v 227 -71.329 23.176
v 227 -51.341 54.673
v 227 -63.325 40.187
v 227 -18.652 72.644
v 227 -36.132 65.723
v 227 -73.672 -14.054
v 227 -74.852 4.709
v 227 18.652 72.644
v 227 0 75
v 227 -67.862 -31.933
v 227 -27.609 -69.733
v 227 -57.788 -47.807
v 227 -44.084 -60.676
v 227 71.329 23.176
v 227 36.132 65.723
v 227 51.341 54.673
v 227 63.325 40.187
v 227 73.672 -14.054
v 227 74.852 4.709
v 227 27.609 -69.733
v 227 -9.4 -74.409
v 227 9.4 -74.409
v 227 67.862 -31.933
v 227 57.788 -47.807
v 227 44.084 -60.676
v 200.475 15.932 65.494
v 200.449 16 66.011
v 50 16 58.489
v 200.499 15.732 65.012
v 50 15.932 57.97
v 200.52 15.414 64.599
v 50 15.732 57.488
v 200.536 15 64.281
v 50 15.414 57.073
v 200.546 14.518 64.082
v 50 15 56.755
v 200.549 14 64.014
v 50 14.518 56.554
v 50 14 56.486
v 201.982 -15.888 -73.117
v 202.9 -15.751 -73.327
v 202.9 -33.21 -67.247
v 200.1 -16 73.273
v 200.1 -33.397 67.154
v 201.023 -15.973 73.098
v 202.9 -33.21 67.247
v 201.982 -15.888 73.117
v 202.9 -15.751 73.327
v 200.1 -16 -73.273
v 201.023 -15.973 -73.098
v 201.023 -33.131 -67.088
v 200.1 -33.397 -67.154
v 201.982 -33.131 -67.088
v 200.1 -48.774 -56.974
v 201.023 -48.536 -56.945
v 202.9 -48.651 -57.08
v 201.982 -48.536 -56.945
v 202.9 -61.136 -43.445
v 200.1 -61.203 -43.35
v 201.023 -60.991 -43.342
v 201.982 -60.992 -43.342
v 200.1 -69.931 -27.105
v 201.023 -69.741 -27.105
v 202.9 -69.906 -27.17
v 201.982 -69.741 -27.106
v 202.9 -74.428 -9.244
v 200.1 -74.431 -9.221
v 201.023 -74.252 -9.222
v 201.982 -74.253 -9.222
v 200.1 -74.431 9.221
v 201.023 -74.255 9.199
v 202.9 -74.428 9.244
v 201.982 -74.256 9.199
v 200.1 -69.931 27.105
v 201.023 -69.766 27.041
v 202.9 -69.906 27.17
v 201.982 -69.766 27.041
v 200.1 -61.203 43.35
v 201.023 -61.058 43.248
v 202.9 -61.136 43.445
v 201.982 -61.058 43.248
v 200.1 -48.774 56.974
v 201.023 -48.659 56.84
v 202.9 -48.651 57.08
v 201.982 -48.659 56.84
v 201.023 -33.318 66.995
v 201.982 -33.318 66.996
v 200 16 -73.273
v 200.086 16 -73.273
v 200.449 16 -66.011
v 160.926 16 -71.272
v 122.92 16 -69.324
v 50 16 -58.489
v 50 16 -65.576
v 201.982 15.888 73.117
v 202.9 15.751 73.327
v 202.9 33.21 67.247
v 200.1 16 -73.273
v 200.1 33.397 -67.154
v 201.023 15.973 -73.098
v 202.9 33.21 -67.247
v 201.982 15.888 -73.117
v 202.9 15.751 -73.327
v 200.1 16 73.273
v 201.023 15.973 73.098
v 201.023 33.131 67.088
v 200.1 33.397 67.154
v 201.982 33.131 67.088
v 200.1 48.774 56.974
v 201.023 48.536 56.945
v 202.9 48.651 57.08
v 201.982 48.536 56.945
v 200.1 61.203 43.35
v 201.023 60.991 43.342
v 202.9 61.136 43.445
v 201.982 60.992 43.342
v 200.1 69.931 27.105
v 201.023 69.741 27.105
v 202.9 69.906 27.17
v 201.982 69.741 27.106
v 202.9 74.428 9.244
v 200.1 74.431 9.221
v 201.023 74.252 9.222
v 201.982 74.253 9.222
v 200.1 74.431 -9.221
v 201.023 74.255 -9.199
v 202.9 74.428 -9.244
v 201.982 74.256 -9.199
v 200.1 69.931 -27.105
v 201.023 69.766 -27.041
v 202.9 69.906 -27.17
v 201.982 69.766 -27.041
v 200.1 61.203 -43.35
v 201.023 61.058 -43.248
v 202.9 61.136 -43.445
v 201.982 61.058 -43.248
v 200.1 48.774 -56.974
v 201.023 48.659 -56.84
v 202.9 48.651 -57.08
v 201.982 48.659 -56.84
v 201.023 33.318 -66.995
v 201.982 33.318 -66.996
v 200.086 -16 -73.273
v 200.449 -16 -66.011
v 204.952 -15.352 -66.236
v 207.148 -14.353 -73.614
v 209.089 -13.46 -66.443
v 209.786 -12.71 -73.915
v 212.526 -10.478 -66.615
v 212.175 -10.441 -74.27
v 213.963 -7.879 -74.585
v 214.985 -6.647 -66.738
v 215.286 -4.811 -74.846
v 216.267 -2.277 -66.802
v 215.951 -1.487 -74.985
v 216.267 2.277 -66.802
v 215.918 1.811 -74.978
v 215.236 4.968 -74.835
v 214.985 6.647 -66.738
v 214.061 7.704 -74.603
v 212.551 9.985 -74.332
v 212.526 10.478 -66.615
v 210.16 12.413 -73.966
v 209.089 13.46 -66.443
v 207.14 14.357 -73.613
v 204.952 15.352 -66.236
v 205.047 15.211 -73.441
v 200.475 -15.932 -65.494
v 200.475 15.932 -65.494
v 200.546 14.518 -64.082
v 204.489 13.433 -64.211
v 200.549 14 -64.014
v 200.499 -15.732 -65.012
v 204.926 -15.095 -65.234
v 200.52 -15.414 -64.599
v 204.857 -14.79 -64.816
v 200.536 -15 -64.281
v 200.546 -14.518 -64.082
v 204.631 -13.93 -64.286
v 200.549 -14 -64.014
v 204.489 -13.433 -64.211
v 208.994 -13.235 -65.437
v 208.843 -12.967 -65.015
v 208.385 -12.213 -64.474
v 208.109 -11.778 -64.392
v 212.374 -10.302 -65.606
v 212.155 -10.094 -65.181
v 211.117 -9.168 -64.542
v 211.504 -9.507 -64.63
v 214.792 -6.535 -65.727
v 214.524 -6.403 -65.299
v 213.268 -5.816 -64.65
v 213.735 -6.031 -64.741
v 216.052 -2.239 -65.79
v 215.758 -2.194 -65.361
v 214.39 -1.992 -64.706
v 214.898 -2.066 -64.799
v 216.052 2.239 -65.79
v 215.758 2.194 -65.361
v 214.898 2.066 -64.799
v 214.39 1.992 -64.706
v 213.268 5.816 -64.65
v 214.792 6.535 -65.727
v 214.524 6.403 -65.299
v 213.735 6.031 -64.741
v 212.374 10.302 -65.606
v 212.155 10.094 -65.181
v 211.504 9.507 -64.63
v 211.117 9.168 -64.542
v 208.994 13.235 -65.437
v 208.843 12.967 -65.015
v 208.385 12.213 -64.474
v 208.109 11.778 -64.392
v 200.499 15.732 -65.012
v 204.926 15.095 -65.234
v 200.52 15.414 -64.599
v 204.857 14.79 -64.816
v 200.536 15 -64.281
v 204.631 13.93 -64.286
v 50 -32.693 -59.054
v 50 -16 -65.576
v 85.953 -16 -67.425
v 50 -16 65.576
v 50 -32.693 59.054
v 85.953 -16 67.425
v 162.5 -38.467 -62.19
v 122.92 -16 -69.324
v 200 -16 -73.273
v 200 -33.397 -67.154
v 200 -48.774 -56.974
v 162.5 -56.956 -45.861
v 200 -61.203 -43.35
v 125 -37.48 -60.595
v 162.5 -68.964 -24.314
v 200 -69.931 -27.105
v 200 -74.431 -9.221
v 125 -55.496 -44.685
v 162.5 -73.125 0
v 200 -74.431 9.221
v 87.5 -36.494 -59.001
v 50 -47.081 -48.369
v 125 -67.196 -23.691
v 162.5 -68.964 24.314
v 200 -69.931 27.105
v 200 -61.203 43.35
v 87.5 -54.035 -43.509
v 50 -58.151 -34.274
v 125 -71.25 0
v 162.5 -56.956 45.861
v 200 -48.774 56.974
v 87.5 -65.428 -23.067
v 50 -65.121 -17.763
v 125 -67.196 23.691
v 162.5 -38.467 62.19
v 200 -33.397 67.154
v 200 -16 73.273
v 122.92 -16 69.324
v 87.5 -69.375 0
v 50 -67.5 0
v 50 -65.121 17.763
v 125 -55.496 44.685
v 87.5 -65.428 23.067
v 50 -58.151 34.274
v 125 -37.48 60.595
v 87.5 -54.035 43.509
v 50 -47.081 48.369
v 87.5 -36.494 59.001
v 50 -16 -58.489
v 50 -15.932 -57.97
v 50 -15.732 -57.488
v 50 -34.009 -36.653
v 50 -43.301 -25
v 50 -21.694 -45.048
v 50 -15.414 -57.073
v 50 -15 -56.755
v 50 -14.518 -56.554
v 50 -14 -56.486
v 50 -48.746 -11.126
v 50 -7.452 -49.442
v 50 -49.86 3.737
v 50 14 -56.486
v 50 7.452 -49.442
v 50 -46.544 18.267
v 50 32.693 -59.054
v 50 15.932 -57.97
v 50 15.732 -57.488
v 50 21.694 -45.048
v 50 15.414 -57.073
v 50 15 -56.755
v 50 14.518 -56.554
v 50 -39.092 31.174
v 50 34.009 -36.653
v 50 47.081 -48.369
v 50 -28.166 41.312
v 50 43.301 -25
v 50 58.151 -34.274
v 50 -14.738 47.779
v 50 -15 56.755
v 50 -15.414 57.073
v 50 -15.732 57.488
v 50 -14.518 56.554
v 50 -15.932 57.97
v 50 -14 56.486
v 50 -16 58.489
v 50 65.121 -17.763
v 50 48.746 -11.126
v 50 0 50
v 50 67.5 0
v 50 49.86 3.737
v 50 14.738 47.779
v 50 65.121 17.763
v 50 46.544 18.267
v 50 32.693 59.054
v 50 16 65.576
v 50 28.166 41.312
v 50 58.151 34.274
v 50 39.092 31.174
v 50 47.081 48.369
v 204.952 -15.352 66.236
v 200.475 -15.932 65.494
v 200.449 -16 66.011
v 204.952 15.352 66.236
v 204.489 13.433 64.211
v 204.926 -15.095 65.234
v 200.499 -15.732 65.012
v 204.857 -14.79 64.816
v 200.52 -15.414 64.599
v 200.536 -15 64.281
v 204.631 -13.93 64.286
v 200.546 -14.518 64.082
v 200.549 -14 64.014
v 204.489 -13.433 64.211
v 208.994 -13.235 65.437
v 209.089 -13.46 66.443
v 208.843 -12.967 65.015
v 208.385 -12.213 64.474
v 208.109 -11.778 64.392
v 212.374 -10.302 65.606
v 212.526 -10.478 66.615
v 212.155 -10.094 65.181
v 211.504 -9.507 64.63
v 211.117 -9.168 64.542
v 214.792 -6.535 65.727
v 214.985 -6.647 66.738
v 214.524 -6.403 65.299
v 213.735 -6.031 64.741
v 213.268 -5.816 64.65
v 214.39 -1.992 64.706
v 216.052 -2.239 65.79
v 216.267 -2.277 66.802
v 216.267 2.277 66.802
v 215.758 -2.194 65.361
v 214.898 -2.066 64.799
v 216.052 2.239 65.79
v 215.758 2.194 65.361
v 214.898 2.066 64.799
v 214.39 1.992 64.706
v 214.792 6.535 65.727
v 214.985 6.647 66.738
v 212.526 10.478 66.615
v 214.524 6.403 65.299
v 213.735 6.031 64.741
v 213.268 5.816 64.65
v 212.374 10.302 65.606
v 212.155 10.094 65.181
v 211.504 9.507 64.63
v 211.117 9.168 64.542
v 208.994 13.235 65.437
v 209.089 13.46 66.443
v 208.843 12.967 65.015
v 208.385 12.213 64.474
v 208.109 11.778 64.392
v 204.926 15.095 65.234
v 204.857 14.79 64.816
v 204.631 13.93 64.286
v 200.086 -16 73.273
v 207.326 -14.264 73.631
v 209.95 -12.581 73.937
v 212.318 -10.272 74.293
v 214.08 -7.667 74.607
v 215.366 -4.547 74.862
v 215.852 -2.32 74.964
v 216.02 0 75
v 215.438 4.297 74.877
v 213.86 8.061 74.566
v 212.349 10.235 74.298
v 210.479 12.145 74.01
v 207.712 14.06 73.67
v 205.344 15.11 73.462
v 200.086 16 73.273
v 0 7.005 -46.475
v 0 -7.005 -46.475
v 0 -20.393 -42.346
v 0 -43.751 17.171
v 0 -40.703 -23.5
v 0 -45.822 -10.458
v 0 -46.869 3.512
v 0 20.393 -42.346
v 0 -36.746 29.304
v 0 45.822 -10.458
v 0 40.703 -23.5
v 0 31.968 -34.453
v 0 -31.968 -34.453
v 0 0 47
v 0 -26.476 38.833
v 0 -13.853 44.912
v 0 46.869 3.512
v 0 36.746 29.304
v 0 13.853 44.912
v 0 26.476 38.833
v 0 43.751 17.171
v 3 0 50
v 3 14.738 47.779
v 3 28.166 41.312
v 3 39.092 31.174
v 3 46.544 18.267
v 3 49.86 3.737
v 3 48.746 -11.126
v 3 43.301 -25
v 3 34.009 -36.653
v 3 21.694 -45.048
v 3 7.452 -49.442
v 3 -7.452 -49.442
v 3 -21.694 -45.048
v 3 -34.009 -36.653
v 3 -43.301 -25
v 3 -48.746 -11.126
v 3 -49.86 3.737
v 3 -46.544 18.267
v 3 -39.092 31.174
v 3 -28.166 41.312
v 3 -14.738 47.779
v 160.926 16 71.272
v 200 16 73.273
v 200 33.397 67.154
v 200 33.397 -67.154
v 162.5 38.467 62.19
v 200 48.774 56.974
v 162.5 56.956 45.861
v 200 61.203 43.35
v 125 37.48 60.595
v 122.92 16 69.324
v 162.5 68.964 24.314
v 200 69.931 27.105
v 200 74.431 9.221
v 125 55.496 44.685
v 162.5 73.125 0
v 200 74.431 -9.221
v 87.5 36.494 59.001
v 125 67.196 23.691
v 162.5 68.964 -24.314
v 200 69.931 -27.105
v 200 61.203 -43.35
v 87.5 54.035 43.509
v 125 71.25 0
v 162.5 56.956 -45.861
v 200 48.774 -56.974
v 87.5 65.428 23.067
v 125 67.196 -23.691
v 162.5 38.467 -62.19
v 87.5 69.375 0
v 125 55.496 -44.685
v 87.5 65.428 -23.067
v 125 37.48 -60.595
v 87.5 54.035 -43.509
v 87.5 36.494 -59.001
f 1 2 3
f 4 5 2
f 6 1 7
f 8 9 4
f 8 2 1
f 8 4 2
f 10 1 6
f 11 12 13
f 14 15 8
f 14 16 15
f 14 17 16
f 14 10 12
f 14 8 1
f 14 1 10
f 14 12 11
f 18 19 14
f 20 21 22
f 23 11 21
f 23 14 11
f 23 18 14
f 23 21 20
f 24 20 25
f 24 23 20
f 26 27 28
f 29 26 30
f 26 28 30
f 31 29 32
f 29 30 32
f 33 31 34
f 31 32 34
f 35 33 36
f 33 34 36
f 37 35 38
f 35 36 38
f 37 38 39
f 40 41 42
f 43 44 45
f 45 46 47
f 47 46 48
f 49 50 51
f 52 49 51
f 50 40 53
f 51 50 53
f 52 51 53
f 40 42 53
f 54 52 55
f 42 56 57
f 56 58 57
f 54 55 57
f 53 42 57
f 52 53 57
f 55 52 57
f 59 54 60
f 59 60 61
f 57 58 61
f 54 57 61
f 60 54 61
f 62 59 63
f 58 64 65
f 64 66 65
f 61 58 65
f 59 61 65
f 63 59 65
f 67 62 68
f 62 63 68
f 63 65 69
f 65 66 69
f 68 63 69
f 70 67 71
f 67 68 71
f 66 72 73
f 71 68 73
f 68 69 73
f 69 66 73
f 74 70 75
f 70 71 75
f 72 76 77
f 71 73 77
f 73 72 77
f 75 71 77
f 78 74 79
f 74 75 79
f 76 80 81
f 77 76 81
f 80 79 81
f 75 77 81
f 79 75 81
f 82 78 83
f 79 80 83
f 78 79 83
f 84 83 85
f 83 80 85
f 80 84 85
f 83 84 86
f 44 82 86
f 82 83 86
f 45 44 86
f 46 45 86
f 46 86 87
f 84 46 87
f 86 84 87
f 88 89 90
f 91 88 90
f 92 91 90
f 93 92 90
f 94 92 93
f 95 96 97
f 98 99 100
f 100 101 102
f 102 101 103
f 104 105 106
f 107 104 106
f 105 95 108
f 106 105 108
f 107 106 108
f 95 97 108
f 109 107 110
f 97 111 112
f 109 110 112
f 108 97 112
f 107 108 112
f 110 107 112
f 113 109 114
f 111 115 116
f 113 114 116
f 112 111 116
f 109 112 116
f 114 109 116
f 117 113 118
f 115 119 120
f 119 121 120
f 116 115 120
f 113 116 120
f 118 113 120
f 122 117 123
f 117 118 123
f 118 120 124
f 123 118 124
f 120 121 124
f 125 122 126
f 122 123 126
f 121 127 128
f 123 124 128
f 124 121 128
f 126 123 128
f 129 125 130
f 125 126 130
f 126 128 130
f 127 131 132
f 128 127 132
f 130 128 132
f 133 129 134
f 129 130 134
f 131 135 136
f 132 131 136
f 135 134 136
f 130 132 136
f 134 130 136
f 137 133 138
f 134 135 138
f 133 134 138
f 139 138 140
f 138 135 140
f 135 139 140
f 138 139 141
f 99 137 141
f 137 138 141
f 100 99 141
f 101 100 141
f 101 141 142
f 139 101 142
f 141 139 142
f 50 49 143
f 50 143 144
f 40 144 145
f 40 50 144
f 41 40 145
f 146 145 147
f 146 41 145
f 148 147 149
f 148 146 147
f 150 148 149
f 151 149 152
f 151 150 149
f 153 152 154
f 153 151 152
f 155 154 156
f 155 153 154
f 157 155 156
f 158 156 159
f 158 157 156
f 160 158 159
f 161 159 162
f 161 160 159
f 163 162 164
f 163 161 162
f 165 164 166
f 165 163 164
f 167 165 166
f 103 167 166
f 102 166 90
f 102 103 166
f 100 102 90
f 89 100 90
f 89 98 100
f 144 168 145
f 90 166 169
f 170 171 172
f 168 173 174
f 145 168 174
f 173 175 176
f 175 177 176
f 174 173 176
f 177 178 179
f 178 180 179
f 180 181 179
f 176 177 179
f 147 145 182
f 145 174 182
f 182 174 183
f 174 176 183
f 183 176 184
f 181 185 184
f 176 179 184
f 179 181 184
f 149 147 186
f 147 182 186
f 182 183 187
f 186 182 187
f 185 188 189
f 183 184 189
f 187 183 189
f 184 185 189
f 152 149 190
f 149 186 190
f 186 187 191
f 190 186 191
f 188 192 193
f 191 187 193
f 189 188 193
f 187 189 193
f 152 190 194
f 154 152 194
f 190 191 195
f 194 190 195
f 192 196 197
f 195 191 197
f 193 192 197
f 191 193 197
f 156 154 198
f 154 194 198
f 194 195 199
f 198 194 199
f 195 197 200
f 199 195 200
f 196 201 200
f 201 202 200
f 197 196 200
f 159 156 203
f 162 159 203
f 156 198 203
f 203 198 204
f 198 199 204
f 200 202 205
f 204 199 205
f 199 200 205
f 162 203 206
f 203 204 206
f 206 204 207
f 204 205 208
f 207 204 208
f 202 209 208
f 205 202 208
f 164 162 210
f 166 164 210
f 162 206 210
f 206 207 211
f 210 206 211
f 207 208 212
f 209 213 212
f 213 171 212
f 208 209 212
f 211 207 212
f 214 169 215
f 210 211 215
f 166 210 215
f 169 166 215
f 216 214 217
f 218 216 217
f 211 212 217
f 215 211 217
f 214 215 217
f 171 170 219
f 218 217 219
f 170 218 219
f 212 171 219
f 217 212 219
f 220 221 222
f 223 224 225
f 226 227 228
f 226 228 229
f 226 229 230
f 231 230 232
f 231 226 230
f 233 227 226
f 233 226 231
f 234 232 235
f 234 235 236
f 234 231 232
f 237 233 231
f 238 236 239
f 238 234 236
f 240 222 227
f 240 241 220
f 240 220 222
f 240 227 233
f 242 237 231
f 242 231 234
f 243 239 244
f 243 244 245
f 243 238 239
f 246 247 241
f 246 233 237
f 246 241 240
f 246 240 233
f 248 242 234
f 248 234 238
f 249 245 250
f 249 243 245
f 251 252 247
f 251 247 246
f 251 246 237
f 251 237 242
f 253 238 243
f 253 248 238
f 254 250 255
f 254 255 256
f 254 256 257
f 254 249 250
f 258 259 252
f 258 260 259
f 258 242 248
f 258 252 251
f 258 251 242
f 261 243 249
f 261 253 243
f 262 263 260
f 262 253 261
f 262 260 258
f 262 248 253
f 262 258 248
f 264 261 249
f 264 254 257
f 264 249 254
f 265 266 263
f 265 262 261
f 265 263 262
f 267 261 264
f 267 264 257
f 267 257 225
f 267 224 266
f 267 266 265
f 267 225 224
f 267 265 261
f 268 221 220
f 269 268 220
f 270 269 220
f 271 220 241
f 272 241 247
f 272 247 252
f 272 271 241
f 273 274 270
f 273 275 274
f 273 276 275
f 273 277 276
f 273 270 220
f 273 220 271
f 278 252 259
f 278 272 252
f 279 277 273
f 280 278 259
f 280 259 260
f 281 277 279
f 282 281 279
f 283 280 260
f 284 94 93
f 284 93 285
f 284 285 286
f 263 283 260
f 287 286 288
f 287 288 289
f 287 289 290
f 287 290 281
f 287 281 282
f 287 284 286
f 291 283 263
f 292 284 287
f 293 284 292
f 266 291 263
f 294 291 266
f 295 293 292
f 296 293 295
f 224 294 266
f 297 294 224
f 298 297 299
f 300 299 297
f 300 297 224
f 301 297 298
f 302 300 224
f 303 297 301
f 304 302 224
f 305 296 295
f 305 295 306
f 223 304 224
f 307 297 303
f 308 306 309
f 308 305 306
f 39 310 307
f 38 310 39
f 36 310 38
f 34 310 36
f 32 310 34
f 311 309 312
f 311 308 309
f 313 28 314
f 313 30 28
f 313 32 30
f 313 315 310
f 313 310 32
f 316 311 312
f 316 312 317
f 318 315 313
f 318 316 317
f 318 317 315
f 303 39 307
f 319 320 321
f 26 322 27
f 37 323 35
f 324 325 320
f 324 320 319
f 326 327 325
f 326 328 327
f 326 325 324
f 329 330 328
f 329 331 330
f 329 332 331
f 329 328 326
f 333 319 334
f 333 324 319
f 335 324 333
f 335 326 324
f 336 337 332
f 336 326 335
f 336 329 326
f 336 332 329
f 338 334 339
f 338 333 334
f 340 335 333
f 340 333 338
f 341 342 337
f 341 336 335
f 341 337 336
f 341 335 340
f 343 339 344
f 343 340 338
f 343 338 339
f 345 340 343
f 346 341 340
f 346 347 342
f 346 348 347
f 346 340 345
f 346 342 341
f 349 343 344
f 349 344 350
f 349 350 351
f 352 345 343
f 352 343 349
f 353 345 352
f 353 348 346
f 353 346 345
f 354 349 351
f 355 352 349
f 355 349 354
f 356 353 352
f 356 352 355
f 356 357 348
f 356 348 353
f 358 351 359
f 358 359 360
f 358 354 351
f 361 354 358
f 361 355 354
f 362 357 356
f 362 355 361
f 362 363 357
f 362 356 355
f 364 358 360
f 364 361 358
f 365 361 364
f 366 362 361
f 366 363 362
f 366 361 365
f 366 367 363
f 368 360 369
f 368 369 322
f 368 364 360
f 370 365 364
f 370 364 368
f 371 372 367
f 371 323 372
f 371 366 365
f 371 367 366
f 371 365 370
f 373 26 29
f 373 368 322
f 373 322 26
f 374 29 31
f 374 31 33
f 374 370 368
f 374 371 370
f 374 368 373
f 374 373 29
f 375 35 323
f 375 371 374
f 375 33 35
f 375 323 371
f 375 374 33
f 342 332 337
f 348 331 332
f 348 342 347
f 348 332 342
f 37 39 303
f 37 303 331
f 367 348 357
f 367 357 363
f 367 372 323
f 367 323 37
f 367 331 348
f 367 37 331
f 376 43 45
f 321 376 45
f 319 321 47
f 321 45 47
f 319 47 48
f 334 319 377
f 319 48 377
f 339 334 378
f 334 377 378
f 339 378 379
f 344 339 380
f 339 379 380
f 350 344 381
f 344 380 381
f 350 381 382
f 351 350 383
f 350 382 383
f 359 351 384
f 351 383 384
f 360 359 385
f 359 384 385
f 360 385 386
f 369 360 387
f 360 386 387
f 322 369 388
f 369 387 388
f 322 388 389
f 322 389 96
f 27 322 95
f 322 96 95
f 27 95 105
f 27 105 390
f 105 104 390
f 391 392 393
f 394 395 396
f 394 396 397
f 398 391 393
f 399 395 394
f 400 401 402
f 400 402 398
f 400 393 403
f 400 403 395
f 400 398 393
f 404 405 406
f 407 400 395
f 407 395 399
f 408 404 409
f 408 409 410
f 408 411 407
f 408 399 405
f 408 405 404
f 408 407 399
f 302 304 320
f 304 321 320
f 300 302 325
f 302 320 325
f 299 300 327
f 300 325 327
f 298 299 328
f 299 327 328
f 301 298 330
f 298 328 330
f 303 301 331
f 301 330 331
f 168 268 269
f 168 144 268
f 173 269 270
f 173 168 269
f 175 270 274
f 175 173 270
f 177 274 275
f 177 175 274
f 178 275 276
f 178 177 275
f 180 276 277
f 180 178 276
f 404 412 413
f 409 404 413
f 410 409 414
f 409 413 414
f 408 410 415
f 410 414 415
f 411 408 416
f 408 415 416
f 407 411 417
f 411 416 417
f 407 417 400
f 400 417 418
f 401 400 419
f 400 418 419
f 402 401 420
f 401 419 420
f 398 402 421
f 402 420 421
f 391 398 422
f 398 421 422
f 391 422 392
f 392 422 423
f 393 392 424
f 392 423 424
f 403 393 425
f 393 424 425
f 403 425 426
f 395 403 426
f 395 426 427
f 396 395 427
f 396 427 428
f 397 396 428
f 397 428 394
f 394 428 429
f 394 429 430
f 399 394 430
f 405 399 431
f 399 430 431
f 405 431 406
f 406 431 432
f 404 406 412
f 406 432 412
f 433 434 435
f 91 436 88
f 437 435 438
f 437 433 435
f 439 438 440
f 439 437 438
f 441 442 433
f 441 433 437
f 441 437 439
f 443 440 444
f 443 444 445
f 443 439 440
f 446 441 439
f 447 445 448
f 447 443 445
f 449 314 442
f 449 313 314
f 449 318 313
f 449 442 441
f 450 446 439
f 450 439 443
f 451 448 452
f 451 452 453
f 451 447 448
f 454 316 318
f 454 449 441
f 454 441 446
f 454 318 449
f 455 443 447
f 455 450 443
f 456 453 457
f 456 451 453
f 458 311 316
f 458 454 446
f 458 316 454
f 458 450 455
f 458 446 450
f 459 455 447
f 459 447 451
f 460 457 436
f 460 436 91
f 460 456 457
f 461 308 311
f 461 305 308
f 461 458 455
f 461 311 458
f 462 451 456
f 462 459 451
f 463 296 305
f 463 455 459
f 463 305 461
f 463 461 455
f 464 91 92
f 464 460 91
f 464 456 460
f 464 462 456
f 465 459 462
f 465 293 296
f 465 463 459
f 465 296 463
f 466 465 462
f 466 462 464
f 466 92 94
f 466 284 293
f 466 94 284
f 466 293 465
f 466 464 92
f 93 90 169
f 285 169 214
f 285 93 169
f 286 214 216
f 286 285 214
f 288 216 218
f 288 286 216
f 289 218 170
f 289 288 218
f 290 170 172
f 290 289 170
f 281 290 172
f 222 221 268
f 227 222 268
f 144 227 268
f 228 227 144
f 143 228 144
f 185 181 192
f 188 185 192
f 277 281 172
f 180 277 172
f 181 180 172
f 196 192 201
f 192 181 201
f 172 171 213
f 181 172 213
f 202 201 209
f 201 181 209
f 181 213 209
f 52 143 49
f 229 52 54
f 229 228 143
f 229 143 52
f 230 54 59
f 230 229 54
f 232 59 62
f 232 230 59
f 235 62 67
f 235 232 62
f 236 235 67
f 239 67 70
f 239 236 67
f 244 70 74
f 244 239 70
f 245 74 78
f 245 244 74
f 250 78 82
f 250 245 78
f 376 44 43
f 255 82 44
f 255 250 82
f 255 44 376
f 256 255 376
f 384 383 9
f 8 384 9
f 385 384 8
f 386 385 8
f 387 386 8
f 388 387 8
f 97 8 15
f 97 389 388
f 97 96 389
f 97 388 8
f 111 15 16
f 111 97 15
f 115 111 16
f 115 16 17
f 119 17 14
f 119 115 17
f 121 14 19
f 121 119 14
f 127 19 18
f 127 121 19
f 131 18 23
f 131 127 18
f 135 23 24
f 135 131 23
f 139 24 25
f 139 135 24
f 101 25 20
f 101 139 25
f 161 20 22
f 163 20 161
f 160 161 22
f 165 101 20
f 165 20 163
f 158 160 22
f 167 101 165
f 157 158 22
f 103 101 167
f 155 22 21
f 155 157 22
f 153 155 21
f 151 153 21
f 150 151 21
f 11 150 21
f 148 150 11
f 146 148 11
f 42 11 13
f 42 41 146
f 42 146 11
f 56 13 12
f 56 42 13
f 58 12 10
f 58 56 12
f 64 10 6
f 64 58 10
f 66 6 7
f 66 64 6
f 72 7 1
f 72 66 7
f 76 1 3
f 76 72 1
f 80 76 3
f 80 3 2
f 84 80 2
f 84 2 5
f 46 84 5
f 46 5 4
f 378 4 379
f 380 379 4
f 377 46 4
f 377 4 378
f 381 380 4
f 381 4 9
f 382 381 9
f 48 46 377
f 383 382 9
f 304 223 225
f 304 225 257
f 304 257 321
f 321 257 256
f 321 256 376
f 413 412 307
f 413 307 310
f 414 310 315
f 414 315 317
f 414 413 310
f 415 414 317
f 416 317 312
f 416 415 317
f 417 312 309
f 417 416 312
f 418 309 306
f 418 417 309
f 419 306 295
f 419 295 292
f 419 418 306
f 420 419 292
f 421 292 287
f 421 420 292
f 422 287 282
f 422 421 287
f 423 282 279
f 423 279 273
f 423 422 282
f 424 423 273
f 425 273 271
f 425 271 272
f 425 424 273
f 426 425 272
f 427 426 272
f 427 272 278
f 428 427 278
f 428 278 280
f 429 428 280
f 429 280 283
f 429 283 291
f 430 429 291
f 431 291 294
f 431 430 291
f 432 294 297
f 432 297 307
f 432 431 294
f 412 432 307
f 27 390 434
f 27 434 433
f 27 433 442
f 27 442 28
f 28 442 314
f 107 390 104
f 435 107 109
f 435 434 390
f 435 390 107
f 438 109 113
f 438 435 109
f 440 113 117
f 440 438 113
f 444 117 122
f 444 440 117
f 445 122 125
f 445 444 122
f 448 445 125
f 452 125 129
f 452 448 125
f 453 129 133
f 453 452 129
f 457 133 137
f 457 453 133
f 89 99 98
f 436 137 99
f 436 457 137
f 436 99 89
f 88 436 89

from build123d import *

# Parameters (mm, degrees)
F4_DEPTH = 11
F5_R     = 5
F7_SIZE  = 3
F8_R     = 2


# Not quite as in the source:
# - a pattern or mirror of a feature is missing from the dataset's text; its kind, count and spacing are read off the source's solid


with BuildPart() as f1:
    # F0 (on Front) → F1 (revolve)
    with BuildSketch(Plane.XZ):
        Polygon((0, 50), (0, 0), (227, 0), (227, 75), (200, 75), (50, 67.5), (50, 50), align=None)
    revolve(axis=Axis((113.5, 0, 0), (-1, 0, 0)))

    # F3 (on line) → F4 (cut)
    with BuildSketch(Plane(origin=(-3.2418952618, 0, 64.8379052369), x_dir=(0.9987523389, 0, 0.0499376169), z_dir=(-0.0499376169, 0, 0.9987523389))):
        with BuildLine():
            Line((0, 16), (0, -16))
            Line((0, -16), (203.4957890464, -16))
            ThreePointArc((203.4957890464, -16), (219.4957890464, 0), (203.4957890464, 16))
            Line((203.4957890464, 16), (0, 16))
        make_face()
    f4 = extrude(amount=-F4_DEPTH, mode=Mode.SUBTRACT)

    # F4_copies: F4 across plane
    add(f4.mirror(Plane(origin=(0, 0, -1e-06), x_dir=(-1, 0, 0), z_dir=(0, 0, -1))), mode=Mode.SUBTRACT)

    # F5 (on Front) → F6 (revolve, cut)
    with BuildSketch(Plane.XZ):
        with Locations((201.5, 79.8)):
            Circle(F5_R)
    revolve(axis=Axis((113.5, 0, 0), (-1, 0, 0)), mode=Mode.SUBTRACT)

    # F7
    f7_edges = [f1.edges().sort_by_distance(p)[0] for p in [
        (0, 0, -50),
    ]]
    chamfer(f7_edges, length=F7_SIZE)

    # F8
    f8_edges = [f1.edges().sort_by_distance(p)[0] for p in [
        (125.274657, 16, 60.249991),
        (216.529351, 0, 64.812726),
        (125.274657, -16, 60.249991),
        (125.274657, -16, -60.249993),
        (216.529351, 0, -64.812728),
        (125.274657, 16, -60.249993),
    ]]
    fillet(f8_edges, radius=F8_R)


solid = f1.part
